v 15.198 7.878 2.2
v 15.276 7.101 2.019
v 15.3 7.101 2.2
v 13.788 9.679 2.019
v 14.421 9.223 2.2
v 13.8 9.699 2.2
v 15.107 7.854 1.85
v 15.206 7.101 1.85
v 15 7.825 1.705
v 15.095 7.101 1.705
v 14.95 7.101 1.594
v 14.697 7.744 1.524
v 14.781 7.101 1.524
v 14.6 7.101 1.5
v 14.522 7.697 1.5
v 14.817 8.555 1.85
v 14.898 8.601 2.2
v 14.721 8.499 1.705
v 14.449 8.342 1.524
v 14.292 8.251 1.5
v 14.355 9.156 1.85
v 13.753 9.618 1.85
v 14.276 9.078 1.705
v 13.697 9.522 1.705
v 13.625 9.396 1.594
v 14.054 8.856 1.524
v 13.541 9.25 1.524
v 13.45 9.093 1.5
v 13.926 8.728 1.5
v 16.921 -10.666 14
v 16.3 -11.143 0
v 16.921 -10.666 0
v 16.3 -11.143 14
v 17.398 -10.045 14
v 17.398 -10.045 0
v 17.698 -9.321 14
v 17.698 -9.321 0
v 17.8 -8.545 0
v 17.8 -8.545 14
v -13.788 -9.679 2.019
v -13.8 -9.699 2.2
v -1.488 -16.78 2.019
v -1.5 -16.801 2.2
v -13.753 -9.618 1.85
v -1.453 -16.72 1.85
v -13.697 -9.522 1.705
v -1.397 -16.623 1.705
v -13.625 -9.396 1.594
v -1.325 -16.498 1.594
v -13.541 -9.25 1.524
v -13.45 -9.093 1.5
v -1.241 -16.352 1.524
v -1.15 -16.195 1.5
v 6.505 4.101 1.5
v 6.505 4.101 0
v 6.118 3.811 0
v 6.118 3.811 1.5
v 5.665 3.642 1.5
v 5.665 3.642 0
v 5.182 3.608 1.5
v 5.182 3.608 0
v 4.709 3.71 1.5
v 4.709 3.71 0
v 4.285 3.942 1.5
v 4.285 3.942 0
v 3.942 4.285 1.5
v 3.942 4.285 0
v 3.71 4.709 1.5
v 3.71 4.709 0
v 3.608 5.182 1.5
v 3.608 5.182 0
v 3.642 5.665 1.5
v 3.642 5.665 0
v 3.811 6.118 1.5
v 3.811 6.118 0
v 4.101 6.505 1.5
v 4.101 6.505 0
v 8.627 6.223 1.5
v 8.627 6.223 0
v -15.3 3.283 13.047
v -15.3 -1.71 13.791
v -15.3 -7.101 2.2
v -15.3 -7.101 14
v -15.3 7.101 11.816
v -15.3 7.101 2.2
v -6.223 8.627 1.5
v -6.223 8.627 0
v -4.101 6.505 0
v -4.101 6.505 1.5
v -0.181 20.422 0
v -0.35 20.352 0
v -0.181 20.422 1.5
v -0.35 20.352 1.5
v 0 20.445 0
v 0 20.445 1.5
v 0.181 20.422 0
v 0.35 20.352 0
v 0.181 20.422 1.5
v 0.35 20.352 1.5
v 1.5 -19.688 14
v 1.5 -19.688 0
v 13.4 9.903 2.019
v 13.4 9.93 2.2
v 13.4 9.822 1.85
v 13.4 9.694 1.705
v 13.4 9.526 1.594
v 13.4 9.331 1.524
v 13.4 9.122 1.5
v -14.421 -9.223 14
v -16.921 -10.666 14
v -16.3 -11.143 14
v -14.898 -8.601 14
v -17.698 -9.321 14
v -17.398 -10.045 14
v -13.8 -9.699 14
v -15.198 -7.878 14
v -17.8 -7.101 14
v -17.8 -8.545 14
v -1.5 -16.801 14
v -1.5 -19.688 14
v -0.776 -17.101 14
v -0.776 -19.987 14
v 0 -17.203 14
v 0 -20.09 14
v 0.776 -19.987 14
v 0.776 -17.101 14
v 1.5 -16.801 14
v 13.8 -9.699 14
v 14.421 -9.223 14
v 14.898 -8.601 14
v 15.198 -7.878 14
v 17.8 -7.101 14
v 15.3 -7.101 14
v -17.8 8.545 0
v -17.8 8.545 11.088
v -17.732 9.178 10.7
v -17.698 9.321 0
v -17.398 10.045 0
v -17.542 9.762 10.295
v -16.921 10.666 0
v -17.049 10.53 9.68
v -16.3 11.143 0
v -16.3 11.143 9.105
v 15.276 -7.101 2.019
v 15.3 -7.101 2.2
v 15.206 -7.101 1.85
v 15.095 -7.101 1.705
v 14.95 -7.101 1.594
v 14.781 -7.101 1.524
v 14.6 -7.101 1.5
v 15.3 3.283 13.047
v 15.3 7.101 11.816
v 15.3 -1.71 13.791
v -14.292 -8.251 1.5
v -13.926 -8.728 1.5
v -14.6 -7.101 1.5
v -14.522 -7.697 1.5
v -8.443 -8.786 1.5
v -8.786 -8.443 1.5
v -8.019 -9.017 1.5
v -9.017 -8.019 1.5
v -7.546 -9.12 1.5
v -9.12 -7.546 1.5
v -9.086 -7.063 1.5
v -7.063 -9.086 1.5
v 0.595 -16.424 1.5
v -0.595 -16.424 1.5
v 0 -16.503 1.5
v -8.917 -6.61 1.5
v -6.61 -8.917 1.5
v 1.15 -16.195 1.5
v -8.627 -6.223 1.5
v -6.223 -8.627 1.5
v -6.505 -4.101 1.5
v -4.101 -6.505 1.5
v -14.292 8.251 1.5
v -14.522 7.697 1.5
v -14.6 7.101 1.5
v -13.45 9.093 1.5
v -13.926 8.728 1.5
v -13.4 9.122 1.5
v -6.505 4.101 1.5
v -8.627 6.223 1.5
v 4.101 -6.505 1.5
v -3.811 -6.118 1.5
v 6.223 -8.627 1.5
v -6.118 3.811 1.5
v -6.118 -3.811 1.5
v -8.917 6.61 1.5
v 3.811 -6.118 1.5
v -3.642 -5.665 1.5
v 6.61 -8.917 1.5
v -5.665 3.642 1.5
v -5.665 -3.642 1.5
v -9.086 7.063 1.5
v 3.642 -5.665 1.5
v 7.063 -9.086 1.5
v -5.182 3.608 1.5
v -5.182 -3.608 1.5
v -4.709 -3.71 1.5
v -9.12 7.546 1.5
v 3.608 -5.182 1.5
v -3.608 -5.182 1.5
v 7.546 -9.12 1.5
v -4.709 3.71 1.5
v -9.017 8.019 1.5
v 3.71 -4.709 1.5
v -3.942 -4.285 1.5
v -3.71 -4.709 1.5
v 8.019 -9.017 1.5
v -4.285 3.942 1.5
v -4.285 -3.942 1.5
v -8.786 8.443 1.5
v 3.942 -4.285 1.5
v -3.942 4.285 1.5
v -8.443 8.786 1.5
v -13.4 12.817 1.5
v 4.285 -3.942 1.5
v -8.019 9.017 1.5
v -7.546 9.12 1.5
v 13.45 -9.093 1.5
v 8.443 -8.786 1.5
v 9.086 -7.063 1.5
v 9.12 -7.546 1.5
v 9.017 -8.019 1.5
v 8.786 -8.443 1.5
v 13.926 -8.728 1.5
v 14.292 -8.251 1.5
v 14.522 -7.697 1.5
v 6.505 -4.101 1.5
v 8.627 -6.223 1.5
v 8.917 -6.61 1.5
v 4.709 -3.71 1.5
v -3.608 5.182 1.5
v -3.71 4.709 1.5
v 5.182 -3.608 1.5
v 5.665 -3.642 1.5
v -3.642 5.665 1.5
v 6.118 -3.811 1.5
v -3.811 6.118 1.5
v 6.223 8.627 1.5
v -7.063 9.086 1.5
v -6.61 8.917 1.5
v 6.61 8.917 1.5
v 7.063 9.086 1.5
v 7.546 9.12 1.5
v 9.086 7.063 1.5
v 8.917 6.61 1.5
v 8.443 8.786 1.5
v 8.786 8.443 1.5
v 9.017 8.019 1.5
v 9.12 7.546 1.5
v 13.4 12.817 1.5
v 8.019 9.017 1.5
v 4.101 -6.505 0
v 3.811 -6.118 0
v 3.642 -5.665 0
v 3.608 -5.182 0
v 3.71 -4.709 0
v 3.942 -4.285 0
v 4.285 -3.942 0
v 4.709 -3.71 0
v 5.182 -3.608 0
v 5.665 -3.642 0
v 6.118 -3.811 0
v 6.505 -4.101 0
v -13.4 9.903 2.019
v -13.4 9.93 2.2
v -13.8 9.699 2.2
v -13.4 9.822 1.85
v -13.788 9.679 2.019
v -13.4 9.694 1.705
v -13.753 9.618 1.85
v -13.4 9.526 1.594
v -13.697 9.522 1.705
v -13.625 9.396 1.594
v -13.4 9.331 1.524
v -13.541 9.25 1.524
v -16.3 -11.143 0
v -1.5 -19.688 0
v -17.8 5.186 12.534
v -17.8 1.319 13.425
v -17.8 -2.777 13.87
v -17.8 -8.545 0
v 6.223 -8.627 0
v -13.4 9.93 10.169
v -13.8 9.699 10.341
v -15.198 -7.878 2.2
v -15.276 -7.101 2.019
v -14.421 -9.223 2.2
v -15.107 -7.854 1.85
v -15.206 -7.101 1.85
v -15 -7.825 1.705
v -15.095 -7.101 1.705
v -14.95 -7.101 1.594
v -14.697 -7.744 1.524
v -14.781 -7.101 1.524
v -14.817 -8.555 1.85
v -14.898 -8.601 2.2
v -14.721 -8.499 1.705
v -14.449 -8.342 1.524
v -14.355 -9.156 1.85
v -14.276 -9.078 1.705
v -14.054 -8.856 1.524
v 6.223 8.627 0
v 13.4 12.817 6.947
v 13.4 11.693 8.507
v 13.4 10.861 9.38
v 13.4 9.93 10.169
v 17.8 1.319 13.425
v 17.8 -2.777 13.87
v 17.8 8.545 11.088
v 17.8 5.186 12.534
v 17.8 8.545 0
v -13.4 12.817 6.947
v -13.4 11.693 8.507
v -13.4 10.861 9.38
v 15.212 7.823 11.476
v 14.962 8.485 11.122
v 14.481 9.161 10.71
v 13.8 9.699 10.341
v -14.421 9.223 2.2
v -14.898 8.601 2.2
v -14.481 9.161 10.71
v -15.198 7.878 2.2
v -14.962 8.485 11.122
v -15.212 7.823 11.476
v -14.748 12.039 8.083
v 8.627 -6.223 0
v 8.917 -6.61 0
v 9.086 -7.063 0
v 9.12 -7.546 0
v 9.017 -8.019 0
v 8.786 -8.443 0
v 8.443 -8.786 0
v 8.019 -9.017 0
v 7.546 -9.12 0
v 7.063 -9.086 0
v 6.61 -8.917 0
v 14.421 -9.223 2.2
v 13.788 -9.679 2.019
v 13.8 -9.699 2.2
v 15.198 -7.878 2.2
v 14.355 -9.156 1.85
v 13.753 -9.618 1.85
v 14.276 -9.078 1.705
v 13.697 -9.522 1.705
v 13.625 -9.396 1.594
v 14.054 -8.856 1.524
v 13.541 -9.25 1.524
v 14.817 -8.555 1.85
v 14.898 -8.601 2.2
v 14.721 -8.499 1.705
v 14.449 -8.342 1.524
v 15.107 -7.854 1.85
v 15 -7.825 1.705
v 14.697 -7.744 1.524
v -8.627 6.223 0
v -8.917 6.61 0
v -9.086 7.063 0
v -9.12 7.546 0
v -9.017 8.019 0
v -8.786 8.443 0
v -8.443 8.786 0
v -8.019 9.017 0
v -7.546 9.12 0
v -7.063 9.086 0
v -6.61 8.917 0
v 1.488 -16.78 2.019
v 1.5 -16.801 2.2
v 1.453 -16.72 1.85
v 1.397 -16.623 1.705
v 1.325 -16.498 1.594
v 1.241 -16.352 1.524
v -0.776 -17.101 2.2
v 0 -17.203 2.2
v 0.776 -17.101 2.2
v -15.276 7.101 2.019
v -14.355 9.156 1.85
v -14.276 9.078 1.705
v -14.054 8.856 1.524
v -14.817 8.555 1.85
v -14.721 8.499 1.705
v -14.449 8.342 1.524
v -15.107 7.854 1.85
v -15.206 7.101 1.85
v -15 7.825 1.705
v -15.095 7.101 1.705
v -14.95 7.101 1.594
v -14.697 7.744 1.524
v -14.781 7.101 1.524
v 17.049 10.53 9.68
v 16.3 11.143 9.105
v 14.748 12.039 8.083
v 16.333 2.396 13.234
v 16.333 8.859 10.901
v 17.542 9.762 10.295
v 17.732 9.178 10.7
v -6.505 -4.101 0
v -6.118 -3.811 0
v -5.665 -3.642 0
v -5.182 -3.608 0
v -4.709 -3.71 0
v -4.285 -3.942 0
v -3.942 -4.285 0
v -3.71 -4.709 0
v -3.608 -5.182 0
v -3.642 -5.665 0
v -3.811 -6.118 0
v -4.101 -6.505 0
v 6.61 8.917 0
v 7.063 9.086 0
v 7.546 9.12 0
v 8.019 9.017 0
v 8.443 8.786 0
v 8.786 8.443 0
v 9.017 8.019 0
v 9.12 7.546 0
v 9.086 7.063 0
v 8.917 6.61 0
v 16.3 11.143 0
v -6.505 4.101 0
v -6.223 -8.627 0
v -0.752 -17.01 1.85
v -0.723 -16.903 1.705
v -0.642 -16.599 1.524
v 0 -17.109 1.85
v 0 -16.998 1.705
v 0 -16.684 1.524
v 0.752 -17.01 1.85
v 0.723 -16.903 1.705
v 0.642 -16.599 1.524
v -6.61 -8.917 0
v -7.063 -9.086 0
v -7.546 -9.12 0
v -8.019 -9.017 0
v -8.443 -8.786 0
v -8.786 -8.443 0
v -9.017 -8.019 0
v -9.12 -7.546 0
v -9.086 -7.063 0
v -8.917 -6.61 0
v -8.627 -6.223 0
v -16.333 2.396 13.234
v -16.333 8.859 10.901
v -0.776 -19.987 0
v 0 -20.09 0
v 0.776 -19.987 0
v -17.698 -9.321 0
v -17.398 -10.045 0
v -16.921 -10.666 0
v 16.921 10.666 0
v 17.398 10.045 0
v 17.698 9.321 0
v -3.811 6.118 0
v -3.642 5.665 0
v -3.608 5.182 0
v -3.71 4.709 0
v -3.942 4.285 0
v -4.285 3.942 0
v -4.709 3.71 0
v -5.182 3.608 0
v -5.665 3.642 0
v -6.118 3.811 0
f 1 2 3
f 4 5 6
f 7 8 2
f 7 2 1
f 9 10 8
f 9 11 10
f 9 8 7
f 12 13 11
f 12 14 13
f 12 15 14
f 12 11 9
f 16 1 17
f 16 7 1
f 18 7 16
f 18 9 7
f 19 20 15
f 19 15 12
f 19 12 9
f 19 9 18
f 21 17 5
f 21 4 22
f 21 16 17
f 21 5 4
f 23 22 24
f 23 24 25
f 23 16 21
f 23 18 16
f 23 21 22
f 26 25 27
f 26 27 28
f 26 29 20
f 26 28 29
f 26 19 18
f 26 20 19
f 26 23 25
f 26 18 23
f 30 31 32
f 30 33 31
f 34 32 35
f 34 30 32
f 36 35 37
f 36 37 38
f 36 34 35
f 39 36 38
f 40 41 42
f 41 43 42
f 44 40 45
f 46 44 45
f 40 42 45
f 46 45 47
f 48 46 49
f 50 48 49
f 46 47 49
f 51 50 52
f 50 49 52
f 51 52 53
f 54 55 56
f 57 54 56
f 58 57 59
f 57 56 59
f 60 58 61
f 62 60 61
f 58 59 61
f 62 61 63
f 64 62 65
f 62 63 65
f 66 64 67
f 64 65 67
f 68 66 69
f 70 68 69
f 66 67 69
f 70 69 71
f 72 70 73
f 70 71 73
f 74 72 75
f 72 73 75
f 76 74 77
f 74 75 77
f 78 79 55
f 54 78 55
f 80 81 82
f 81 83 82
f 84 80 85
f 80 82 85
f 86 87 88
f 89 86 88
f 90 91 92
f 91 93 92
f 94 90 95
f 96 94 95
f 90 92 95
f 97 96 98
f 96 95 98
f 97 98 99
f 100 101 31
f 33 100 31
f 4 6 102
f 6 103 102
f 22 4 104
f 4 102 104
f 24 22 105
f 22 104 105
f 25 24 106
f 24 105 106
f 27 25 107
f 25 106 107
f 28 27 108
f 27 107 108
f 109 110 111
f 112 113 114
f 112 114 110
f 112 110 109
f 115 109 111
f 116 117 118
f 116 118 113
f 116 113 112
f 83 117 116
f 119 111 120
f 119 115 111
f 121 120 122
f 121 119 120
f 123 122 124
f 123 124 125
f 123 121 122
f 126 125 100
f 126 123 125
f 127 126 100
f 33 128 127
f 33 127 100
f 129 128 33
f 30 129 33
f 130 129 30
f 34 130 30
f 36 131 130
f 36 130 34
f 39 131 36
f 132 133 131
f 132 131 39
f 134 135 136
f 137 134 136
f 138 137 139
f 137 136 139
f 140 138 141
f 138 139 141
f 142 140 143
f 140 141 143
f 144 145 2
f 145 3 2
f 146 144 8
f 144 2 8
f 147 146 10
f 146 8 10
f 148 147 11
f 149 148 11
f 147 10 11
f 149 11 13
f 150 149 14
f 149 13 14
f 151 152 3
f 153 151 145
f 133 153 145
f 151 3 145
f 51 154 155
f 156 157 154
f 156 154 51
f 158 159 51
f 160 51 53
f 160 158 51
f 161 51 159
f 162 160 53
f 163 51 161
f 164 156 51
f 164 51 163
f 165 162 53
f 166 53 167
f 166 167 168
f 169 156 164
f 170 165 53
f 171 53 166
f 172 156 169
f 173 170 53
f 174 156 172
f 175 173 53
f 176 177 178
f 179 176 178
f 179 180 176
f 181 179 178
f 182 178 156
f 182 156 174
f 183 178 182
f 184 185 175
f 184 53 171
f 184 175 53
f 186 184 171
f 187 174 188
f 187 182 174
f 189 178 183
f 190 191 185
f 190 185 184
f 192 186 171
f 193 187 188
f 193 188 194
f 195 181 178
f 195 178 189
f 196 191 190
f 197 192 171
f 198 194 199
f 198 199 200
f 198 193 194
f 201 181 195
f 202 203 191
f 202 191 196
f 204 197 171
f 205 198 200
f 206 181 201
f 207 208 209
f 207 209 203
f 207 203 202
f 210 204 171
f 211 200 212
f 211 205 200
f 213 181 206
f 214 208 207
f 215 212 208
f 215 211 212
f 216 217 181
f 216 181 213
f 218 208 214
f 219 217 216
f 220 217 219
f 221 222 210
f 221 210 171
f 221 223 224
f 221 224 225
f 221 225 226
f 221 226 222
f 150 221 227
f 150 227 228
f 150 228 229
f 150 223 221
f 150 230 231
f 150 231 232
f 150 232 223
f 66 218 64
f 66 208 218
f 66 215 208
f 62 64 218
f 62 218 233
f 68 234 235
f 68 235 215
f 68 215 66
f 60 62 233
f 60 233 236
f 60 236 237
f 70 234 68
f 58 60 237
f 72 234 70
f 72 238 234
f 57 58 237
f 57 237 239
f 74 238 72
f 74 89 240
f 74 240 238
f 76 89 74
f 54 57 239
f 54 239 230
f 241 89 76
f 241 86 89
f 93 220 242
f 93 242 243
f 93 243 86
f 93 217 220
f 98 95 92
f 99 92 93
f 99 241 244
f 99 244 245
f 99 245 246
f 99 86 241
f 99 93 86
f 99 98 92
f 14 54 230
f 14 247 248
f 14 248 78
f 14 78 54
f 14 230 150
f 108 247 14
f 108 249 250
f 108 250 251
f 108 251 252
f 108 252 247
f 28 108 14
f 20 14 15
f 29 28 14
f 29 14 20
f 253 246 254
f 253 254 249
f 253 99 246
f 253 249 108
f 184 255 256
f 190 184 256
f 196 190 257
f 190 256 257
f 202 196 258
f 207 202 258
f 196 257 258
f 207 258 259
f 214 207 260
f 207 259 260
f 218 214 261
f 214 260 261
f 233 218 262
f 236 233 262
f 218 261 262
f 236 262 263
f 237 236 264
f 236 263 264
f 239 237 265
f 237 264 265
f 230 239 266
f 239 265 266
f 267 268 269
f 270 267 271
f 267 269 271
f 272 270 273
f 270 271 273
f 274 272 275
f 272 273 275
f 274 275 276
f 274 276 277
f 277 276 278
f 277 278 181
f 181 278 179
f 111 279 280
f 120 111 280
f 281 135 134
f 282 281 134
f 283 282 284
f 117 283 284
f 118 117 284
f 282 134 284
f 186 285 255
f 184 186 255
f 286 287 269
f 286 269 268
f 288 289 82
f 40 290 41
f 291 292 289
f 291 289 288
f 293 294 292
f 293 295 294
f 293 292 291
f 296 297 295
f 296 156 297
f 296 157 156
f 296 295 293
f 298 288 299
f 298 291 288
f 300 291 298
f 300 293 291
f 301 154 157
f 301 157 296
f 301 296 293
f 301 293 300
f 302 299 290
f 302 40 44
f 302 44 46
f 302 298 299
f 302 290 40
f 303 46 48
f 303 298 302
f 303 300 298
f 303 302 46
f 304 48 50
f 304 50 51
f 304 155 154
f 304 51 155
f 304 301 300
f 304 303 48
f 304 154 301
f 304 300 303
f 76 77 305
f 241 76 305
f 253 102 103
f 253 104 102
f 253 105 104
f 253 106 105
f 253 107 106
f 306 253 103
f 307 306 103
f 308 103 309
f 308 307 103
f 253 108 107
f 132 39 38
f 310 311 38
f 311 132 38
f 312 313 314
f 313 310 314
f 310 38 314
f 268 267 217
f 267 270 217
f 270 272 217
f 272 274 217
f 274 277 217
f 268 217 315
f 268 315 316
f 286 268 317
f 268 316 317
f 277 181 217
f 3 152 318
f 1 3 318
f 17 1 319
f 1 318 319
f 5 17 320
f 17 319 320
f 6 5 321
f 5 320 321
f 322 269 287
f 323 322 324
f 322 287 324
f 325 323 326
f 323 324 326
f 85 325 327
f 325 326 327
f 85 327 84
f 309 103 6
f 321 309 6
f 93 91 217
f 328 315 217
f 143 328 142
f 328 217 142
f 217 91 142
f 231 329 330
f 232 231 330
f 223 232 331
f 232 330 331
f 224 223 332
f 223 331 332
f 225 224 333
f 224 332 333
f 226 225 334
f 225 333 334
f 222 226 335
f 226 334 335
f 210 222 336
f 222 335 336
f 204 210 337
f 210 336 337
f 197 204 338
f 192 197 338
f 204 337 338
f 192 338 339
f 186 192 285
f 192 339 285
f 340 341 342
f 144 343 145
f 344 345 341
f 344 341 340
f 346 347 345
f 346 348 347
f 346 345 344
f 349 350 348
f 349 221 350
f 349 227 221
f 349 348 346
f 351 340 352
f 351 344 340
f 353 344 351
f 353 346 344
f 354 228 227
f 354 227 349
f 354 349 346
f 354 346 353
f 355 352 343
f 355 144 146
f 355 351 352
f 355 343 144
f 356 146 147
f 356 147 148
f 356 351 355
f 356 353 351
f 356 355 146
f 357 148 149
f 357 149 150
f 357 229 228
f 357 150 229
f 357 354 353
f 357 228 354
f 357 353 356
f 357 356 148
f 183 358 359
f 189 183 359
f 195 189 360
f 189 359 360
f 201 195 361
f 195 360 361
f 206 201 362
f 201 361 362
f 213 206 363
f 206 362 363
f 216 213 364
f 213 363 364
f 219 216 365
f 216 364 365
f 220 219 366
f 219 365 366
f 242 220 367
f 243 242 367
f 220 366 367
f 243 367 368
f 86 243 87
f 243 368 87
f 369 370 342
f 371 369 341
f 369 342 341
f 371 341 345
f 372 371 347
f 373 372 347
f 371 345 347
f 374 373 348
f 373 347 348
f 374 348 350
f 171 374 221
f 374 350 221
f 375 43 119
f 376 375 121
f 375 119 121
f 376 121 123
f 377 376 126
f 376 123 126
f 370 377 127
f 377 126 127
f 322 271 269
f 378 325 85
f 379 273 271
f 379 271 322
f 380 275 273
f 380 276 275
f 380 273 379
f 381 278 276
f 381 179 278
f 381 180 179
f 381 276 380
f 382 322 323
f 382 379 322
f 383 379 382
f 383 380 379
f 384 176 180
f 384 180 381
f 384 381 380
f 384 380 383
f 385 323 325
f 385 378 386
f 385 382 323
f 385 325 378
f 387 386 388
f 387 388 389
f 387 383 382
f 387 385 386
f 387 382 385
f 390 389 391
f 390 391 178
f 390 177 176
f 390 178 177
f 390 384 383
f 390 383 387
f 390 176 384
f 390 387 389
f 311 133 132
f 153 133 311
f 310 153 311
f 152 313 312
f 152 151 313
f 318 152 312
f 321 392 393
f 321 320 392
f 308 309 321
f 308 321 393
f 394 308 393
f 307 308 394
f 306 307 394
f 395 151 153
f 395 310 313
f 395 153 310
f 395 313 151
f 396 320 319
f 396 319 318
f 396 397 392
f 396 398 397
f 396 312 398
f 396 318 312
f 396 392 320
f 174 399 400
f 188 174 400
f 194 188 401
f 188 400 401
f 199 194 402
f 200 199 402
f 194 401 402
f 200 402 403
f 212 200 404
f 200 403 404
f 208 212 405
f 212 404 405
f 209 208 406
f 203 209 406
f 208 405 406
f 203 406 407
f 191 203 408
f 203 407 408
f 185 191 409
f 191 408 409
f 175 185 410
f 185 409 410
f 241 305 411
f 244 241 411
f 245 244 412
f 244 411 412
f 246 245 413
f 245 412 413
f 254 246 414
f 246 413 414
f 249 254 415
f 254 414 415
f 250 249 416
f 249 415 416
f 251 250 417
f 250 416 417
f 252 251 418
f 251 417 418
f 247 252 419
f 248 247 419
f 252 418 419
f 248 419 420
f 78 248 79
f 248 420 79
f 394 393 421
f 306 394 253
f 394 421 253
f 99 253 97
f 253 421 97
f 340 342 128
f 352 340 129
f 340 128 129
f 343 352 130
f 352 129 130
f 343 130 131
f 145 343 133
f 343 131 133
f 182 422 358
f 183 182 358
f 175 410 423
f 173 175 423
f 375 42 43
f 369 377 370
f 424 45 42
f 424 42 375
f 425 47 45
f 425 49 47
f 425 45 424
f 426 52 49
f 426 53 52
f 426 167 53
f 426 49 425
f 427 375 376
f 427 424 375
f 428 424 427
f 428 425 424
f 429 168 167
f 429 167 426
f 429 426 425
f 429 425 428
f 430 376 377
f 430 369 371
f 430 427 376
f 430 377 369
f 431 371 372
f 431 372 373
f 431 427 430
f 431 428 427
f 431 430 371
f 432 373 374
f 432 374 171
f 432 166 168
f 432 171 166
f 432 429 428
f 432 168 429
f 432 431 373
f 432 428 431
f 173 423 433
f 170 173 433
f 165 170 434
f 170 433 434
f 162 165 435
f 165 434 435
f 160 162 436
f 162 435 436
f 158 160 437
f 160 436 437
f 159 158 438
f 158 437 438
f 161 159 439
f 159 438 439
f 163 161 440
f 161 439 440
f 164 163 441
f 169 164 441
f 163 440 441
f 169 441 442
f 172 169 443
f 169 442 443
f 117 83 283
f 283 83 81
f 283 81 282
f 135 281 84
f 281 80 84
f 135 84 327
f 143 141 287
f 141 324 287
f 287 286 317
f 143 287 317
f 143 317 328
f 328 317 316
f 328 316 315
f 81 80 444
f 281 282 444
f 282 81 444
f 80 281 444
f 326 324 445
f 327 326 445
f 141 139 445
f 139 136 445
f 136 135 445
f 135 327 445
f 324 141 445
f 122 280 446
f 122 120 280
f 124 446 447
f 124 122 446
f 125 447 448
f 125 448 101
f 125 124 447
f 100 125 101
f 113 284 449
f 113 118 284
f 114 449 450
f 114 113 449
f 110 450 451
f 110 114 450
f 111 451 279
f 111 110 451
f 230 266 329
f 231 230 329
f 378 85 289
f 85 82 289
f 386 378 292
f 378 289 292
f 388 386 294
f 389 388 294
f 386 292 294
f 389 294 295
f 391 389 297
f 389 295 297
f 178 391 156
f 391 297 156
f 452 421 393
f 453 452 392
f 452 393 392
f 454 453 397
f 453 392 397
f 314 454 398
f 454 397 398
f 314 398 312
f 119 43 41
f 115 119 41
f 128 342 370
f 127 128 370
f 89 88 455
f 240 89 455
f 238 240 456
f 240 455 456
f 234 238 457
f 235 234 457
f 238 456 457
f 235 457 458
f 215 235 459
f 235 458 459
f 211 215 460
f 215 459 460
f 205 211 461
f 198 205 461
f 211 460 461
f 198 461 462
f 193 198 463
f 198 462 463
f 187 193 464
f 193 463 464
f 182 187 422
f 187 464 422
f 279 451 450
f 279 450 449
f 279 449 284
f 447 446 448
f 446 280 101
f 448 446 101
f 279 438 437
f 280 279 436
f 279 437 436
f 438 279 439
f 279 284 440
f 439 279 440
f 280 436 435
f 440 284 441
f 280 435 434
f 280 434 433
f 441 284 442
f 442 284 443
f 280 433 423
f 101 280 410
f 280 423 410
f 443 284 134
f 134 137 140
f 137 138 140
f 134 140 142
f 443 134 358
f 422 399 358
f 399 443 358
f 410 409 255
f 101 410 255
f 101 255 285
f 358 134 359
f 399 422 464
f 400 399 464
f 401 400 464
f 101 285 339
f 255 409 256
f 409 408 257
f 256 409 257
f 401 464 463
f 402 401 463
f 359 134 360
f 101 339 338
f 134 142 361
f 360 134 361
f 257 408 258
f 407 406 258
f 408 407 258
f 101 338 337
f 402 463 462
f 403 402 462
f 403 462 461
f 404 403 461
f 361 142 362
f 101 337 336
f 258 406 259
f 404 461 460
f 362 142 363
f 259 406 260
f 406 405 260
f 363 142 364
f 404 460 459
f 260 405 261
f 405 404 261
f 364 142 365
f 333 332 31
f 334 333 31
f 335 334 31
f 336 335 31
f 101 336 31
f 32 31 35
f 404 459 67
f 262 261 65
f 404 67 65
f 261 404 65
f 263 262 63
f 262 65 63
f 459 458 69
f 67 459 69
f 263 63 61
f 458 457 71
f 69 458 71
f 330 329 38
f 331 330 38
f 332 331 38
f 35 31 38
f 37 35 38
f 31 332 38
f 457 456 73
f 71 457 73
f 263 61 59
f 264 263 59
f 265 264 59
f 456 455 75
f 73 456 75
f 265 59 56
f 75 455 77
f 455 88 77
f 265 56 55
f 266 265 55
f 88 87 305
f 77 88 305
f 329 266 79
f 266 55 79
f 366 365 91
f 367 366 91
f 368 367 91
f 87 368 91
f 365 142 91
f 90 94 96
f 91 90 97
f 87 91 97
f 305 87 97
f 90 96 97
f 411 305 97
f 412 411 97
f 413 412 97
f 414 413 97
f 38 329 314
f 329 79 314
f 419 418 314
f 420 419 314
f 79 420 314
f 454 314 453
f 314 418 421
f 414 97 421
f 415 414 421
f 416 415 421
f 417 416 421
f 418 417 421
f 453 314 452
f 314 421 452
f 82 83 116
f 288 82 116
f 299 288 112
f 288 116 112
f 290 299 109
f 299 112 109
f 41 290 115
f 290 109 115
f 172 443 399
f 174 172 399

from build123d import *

# Parameters (mm, degrees)
F1_DEPTH = 1.5
F2_DEPTH = 14
F4_W     = 26.8
F4_H     = 15.749622
F5_DEPTH = 26
F6_R     = 3
F7_R     = 0.7
F9_DEPTH = 18.8


with BuildPart() as f1:
    # F0 (on Top) → F1 (new body)
    with BuildSketch(Plane.XY):
        Polygon((0, -17.666918), (15.3, -8.833459), (15.3, 8.833459), (0, 17.666918), (-15.3, 8.833459), (-15.3, -8.833459), align=None)
        with BuildLine():
            ThreePointArc((-6.22254, -8.626703), (-8.626703, -8.626703), (-8.626703, -6.22254))
            Line((-8.626703, -6.22254), (-6.505382, -4.101219))
            ThreePointArc((-6.505382, -4.101219), (-4.101219, -4.101219), (-4.101219, -6.505382))
            Line((-4.101219, -6.505382), (-6.22254, -8.626703))
        make_face(mode=Mode.SUBTRACT)
        with BuildLine():
            ThreePointArc((8.626703, -6.22254), (8.626703, -8.626703), (6.22254, -8.626703))
            Line((6.22254, -8.626703), (4.101219, -6.505382))
            ThreePointArc((4.101219, -6.505382), (4.101219, -4.101219), (6.505382, -4.101219))
            Line((6.505382, -4.101219), (8.626703, -6.22254))
        make_face(mode=Mode.SUBTRACT)
        with BuildLine():
            ThreePointArc((-8.626703, 6.22254), (-8.626703, 8.626703), (-6.22254, 8.626703))
            Line((-6.22254, 8.626703), (-4.101219, 6.505382))
            ThreePointArc((-4.101219, 6.505382), (-4.101219, 4.101219), (-6.505382, 4.101219))
            Line((-6.505382, 4.101219), (-8.626703, 6.22254))
        make_face(mode=Mode.SUBTRACT)
        with BuildLine():
            Line((4.101219, 6.505382), (6.22254, 8.626703))
            ThreePointArc((6.22254, 8.626703), (8.626703, 8.626703), (8.626703, 6.22254))
            Line((8.626703, 6.22254), (6.505382, 4.101219))
            ThreePointArc((6.505382, 4.101219), (4.101219, 4.101219), (4.101219, 6.505382))
        make_face(mode=Mode.SUBTRACT)
    extrude(amount=F1_DEPTH)

    # F0 (on Top) → F2 (join)
    with BuildSketch(Plane.XY):
        Polygon((-17.8, 10.276835), (-17.8, -10.276835), (0, -20.55367), (17.8, -10.276835), (17.8, 10.276835), (0, 20.55367), align=None)
        Polygon((15.3, 8.833459), (15.3, -8.833459), (0, -17.666918), (-15.3, -8.833459), (-15.3, 8.833459), (0, 17.666918), align=None, mode=Mode.SUBTRACT)
    extrude(amount=F2_DEPTH)

    # F4 (on offset) → F5 (cut)
    with BuildSketch(Plane.XZ.offset(-25)):
        with Locations((0, 9.374811)):
            Rectangle(F4_W, F4_H)
    extrude(amount=F5_DEPTH, mode=Mode.SUBTRACT)

    # F6
    f6_edges = [f1.edges().sort_by_distance(p)[0] for p in [
        (17.8, 10.276835, 7),
        (-17.8, 10.276835, 7),
        (-17.8, -10.276835, 7),
        (0, -20.55367, 7),
        (17.8, -10.276835, 7),
        (15.3, 8.833459, 7.75),
        (15.3, -8.833459, 7.75),
        (0, -17.666918, 7.75),
        (-15.3, -8.833459, 7.75),
        (-15.3, 8.833459, 7.75),
    ]]
    fillet(f6_edges, radius=F6_R)

    # F7
    f7_edges = [f1.edges().sort_by_distance(p)[0] for p in [
        (-13.6, 9.814955, 1.5),
        (0, 20.55367, 0.75),
    ]]
    fillet(f7_edges, radius=F7_R)

    # F8 (on Right) → F9 (cut, symmetric)
    with BuildSketch(Plane.YZ):
        with BuildLine():
            Line((13.07399, 14), (-7.101408, 14))
            add(Edge.make_bspline(
                [(-7.101408, 14), (4.434353, 14), (10.286969, 11.588226), (13.07399, 6.5)],
                knots=[0, 0, 0, 0, 21.524328, 21.524328, 21.524328, 21.524328], degree=3))
            Line((13.07399, 6.5), (13.07399, 14))
        make_face()
    extrude(amount=F9_DEPTH, both=True, mode=Mode.SUBTRACT)


solid = f1.part
